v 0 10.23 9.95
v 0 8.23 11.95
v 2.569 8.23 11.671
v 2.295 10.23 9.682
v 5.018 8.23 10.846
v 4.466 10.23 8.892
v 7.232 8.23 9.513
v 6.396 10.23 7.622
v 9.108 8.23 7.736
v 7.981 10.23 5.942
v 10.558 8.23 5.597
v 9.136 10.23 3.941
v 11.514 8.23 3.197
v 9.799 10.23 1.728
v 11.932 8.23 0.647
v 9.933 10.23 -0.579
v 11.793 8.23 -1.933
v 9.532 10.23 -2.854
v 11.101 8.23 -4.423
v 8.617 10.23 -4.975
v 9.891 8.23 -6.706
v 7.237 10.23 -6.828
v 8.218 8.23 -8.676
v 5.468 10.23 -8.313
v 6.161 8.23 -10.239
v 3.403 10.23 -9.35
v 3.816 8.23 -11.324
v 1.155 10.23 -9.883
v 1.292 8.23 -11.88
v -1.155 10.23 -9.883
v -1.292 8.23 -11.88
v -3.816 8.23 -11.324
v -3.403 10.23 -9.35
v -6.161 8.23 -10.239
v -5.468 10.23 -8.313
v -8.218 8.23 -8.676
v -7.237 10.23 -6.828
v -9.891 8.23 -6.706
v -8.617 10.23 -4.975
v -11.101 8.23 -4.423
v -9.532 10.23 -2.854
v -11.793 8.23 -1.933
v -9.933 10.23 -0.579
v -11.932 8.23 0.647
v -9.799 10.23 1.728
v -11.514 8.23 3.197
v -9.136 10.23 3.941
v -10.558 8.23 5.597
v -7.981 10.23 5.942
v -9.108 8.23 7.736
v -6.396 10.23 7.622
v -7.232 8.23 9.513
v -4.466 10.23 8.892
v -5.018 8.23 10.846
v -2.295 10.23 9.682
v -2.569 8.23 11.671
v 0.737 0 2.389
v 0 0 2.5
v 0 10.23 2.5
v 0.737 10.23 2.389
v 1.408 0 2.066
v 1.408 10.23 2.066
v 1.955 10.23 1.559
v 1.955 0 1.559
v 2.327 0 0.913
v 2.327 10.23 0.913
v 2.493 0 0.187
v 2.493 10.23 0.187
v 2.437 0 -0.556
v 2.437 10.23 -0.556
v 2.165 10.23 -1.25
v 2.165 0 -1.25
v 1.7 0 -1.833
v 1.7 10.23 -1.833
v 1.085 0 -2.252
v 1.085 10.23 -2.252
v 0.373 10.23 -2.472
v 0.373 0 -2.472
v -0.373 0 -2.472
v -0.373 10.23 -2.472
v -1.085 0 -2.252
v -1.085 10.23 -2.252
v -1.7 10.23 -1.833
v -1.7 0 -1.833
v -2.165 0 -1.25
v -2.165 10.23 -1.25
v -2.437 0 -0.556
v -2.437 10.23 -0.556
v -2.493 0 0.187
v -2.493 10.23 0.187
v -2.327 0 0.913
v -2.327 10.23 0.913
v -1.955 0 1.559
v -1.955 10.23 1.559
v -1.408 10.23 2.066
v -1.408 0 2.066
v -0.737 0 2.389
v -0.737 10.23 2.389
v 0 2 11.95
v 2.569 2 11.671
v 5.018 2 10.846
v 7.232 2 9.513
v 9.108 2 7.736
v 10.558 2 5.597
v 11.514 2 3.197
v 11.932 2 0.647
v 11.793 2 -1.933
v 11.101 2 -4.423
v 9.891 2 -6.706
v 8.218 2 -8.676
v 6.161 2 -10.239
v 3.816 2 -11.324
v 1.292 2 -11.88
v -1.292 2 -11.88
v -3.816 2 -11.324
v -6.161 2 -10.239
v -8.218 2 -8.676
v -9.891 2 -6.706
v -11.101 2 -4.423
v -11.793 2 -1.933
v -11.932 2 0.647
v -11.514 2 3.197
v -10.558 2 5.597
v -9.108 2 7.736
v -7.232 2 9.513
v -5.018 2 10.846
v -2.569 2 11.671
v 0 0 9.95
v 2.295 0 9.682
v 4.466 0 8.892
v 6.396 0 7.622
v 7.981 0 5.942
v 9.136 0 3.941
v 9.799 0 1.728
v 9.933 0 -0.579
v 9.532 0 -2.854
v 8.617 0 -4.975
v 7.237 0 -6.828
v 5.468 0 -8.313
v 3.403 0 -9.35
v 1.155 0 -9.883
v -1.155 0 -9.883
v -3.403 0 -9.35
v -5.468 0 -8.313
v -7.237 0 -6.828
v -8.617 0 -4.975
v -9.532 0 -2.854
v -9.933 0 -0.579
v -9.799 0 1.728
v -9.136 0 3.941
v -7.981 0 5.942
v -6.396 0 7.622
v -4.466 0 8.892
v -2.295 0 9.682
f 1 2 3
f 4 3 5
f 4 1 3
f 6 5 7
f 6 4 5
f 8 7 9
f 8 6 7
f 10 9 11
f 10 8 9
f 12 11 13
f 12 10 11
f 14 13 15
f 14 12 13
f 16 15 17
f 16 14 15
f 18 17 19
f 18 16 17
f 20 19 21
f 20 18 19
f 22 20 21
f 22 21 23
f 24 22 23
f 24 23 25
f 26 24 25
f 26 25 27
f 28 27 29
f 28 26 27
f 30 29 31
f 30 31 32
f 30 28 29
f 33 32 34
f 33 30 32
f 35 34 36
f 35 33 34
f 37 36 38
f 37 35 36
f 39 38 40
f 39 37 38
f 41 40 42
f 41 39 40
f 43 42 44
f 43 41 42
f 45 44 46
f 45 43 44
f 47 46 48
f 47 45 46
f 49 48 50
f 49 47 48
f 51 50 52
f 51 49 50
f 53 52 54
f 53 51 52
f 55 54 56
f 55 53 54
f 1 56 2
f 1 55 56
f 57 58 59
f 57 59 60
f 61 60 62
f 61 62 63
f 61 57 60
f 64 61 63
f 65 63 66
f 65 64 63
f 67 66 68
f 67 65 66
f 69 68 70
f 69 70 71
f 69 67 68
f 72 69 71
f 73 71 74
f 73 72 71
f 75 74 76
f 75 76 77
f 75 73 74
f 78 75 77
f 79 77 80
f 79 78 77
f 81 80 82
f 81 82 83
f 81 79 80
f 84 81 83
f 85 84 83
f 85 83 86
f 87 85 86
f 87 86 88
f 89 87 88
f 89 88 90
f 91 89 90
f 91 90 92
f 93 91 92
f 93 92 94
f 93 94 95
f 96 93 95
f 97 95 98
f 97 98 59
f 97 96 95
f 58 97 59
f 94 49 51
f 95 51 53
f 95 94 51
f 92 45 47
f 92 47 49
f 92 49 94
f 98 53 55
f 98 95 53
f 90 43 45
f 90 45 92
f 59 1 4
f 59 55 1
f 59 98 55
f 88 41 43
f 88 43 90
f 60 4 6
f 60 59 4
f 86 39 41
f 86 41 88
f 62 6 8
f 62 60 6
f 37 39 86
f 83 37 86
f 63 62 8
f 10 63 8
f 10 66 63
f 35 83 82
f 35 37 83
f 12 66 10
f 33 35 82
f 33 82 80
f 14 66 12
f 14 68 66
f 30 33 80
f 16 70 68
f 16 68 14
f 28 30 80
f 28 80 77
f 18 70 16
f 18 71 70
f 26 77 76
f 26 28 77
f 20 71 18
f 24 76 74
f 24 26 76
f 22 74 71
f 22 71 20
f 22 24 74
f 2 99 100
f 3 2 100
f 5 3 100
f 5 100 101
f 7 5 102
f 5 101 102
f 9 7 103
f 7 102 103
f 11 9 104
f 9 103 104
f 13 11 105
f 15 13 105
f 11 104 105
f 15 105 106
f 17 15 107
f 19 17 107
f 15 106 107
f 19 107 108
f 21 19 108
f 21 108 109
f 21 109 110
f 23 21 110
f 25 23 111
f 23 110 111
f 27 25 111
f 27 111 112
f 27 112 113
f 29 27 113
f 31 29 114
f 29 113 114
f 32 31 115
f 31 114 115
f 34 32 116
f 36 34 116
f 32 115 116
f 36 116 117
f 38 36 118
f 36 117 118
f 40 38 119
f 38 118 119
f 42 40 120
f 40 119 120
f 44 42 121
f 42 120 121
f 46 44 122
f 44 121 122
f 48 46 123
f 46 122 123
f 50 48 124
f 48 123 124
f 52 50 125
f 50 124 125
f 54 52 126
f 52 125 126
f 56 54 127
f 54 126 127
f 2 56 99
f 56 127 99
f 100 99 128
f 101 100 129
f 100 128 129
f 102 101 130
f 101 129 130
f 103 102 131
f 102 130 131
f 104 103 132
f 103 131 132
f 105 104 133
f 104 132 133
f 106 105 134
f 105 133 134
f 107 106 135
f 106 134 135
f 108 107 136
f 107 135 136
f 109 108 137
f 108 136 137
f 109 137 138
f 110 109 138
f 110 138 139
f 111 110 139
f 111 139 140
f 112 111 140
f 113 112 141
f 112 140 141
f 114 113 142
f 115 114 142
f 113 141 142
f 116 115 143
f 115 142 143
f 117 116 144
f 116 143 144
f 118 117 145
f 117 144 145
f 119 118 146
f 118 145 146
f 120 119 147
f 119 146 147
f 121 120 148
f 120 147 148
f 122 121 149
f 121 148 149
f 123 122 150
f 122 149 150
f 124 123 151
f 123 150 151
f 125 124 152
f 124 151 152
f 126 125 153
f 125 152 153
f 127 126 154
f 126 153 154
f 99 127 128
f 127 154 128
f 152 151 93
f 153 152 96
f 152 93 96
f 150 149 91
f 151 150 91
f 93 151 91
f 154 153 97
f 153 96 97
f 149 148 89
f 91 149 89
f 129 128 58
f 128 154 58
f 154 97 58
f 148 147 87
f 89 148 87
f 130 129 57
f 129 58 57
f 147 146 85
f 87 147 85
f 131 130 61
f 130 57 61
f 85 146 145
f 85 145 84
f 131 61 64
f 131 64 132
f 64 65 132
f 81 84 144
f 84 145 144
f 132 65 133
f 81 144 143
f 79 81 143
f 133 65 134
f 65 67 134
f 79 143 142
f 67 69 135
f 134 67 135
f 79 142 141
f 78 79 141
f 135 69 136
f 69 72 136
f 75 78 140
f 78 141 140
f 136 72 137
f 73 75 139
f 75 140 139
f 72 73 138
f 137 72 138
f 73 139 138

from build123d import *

# Parameters (mm, degrees)
SKETCH1_R           = 11.95
SKETCH1_R_2         = 7.985
BOSS_EXTRUDE1_DEPTH = 10.23
CHAMFER1_SIZE       = 2
SKETCH2_R           = 7.985
SKETCH2_R_2         = 2.5
BOSS_EXTRUDE3_DEPTH = 10.23


with BuildPart() as part:
    # Sketch1 → Boss-Extrude1 (new body)
    with BuildSketch(Plane(origin=(0, 0, 0), x_dir=(1, 0, 0), z_dir=(0, 1, 0))):
        with Locations(Location((0, 0, 0), (0, 0, 270))):
            Circle(SKETCH1_R)
        with Locations(Location((0, 0, 0), (0, 0, 270))):
            Circle(SKETCH1_R_2, mode=Mode.SUBTRACT)
    extrude(amount=BOSS_EXTRUDE1_DEPTH)

    # Chamfer1
    chamfer1_edges = [part.edges().sort_by_distance(p)[0] for p in [
        (0, 0, -11.95),
        (0, 10.23, -11.95),
    ]]
    chamfer(chamfer1_edges, length=CHAMFER1_SIZE)

    # Sketch2 → Boss-Extrude3 (add)
    with BuildSketch(Plane(origin=(0, 0, 0), x_dir=(1, 0, 0), z_dir=(0, 1, 0))):
        Circle(SKETCH2_R)
        with Locations(Location((0, 0, 0), (0, 0, 270))):
            Circle(SKETCH2_R_2, mode=Mode.SUBTRACT)
    extrude(amount=BOSS_EXTRUDE3_DEPTH)


solid = part.part
